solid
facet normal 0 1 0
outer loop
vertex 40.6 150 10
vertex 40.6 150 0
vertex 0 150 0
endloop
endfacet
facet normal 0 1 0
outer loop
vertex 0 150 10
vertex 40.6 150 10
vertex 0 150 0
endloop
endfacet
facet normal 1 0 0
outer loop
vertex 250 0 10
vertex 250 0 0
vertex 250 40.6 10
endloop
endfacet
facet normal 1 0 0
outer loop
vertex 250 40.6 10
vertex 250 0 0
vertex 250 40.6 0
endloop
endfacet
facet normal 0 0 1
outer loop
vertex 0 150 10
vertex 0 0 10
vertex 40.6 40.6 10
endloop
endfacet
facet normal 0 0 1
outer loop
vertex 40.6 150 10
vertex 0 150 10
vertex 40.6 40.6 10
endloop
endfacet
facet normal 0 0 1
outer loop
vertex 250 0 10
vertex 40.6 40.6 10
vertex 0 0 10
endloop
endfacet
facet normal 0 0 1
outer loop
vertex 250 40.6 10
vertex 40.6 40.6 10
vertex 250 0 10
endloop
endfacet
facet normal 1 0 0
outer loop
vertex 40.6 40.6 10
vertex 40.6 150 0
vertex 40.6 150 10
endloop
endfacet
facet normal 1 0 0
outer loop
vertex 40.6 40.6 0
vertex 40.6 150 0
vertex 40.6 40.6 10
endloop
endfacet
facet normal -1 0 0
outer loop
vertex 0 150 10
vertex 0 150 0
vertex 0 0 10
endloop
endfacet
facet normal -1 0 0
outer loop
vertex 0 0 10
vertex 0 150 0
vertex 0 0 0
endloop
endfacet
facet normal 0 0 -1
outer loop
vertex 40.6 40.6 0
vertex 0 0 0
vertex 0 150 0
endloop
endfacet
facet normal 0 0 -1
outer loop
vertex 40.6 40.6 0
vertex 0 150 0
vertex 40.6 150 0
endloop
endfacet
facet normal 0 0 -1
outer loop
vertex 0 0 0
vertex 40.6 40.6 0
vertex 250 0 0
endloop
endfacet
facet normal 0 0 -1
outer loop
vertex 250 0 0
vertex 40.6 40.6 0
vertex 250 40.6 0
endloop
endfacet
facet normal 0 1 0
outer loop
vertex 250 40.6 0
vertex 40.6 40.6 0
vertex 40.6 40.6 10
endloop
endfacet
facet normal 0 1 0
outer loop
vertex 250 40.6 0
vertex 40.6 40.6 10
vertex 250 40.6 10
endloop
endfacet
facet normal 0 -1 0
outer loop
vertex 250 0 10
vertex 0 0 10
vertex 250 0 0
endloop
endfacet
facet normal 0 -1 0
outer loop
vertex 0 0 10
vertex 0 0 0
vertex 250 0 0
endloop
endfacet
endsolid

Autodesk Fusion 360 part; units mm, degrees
sketch "スケッチ1" plane through (0, 0, 0) normal (0, 0, 1) x (1, 0, 0)
  line L0 (0, 0) -> (250, 0)
  line L1 (250, 0) -> (250, 150)
  line L2 (250, 150) -> (0, 150)
  line L3 (0, 150) -> (0, 0)
  line L4 (250, 150) -> (40.6, 150)
  line L5 (40.6, 150) -> (40.6, 40.6)
  line L6 (40.6, 40.6) -> (250, 40.6)
  line L7 (250, 40.6) -> (250, 150)
  dimension "d1" = 250
  dimension "d2" = 150
  dimension "d3" = 40.6
  dimension "d4" = 40.6
extrude "押し出し1" add sketch "スケッチ1" along normal blind 10 contours L0 L1 L2 L3 L5 L6
